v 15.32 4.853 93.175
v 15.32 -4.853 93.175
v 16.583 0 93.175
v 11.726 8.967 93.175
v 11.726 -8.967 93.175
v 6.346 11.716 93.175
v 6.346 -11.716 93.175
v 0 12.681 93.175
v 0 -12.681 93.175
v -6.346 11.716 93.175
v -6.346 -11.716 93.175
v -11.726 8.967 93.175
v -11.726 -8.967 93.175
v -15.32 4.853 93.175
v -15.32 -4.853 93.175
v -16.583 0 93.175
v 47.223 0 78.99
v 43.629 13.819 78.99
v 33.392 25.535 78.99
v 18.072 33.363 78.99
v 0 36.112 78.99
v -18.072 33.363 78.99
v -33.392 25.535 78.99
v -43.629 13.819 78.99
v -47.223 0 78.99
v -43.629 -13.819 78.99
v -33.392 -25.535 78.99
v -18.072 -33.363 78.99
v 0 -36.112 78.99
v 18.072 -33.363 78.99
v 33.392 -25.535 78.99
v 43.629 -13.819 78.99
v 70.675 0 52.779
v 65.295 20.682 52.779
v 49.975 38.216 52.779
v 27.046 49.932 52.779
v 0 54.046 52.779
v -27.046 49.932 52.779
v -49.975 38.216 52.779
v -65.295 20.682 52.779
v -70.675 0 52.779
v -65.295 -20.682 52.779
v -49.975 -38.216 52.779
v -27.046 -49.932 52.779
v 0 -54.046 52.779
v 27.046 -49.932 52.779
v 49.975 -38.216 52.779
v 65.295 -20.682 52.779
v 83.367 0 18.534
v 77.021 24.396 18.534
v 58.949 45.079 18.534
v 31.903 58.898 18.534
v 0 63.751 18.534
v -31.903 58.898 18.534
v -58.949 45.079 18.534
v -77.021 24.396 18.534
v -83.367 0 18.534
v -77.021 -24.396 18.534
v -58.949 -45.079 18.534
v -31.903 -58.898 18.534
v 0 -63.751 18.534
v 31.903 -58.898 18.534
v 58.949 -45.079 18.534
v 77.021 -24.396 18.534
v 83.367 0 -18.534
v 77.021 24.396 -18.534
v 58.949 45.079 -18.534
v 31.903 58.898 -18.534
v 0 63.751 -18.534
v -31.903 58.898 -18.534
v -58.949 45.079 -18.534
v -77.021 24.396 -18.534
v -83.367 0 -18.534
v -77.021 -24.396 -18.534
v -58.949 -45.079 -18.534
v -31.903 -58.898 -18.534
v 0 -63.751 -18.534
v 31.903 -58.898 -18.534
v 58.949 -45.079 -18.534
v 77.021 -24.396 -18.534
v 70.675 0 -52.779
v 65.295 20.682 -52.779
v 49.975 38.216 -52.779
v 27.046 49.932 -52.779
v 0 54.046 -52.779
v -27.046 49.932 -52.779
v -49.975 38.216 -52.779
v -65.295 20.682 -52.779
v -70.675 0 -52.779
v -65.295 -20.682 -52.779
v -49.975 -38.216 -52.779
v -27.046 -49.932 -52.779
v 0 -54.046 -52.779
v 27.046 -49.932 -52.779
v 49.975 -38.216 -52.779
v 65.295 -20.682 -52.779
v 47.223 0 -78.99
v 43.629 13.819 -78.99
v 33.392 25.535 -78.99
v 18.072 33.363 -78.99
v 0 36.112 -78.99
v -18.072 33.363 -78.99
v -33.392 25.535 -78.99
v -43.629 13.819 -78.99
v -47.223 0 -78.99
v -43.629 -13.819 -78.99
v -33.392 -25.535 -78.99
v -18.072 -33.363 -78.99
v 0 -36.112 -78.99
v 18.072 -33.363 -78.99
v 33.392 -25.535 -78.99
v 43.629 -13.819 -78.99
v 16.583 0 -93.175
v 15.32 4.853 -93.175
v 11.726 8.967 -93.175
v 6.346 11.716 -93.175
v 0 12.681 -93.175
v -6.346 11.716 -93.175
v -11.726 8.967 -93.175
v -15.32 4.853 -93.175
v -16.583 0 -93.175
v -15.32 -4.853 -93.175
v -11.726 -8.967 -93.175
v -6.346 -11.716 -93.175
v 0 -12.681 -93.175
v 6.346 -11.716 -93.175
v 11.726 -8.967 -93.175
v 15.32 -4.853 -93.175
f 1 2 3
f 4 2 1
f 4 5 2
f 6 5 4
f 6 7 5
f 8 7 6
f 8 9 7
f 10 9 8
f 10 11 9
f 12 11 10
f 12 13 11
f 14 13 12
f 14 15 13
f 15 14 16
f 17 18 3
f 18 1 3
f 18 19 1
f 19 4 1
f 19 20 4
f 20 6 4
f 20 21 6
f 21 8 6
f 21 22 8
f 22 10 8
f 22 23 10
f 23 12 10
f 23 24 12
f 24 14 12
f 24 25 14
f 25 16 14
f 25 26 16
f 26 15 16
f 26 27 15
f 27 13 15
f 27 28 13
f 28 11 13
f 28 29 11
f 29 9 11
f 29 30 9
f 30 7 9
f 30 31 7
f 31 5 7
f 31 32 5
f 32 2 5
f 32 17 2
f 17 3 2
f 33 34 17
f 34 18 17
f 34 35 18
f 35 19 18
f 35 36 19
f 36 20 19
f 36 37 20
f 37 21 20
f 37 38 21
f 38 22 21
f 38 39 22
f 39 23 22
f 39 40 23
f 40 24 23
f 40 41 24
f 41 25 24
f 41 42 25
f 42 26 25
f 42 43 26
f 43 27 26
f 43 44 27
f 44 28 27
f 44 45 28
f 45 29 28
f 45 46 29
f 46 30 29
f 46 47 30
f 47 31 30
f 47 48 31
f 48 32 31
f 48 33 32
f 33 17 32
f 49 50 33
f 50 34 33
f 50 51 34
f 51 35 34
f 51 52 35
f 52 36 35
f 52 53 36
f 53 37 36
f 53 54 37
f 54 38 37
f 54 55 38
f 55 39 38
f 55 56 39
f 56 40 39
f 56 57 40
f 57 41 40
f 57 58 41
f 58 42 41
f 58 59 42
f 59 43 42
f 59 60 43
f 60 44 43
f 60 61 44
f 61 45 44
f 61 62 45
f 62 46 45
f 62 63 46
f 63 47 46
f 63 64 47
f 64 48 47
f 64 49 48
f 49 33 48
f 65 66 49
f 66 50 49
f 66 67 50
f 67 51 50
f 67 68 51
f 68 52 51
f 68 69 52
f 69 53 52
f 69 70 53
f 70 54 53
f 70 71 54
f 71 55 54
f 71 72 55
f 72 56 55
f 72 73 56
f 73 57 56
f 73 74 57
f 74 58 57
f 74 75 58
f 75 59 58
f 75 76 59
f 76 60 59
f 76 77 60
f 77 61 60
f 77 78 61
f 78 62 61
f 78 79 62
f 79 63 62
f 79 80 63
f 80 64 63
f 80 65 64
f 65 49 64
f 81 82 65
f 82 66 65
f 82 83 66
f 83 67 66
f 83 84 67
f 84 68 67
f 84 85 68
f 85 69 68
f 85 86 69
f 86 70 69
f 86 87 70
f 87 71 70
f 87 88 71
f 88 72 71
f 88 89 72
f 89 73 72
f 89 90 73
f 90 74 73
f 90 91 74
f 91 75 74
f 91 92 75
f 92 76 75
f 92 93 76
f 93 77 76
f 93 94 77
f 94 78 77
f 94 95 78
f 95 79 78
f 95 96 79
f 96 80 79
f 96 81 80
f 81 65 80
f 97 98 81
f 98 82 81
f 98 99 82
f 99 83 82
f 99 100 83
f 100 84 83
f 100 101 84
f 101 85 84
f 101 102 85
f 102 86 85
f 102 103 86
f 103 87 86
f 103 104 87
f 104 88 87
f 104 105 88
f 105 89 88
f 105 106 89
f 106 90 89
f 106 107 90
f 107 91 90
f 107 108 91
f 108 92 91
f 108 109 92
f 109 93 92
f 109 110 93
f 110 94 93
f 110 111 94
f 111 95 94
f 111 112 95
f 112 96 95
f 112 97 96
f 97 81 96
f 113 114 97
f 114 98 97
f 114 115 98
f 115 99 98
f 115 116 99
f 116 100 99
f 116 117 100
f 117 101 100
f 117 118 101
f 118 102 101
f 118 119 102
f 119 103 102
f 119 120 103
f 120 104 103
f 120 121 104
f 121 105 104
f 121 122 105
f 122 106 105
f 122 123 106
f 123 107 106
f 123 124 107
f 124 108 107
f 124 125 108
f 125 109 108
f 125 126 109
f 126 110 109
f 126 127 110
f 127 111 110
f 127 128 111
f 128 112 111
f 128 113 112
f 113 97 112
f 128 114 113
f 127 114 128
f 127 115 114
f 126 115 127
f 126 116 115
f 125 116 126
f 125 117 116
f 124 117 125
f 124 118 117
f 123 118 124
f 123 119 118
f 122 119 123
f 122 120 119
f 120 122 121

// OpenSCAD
// Generated by SolidPython 1.0.1 on 2020-07-29 00:46:53


scale(v = [17, 13, 19]) {
	sphere(r = 5);
}
/***********************************************
*********      SolidPython code:      **********
************************************************
 
# import packages: SolidPython
from solid import *
from solid.utils import *
from itertools import chain, combinations, permutations


class Resize:

    def __init__(self, scad_file):
        self.scad_file = scad_file
        #self.scad_file = import_scad(scad_file)
        # cone/cylinder param:
        self.r1 = 0
        self.r2 = 0
        self.h = 0
        # rectangular prism param:
        self.w = 0
        self.l = 0
        # ellipse param:
        self.r = 0

    # import OpenScad code (file name corresponds to shape)


    # classify shape + parameters
    def assign(self, param1, param2, param3):
        if self.scad_file == 'cone.scad':
            self.r1 = param1
            self.r2 = param2
            self.h = param3
        elif self.scad_file == 'cylinder.scad':
            self.r1 = param1
            self.r2 = param2
            self.h = param3
        elif self.scad_file == 'rectangularPrism.scad':
            self.h = param1
            self.l = param2
            self.w = param3
        else:
            self.r = param1
            self.h = param2

    # resize parameters
    def iterate(self):
        x = range(3, 20, 2)
        i = 1
        if self.scad_file == 'cone.scad':
            tempList = list(permutations(x, 2))
            for temp in tempList:
                param1 = temp[0]
                param2 = temp[1]
                filepath = 'produced_scad_files/' + 'cone' + str(param1) + '_' + str(param2) + '_' + '.scad'
                scad_render_to_file(cylinder(h=param1, r1=param2, r2=0), filepath)

        elif self.scad_file == 'cylinder.scad':
            tempList = list(permutations(x, 3))
            for temp in tempList:
                param1 = temp[0]
                param2 = temp[1]
                filepath = 'produced_scad_files/' + 'cylinder' + str(param1) + '_' + str(param2) + '_' + '.scad'
                scad_render_to_file(cylinder(h=param1, r1=param2, r2=param2), filepath)

        elif self.scad_file == 'rectangularPrism.scad':
            tempList = list(permutations(x, 3))
            for temp in tempList:
                param1 = temp[0]
                param2 = temp[1]
                param3 = temp[2]
                filepath = 'produced_scad_files/' + 'rectangularPrism' + str(param1) + '_' + str(param2) + '_' + str(
                    param3) + '.scad'
                scad_render_to_file(cube(size=(param1, param2, param3)), filepath)

        elif self.scad_file == 'ellipse.scad':
            tempList = list(permutations(x, 4))
            for temp in tempList:
                param1 = temp[0]
                param2 = temp[1]
                param3 = temp[2]
                param4 = temp[3]
                filepath = 'produced_scad_files/' + 'ellipse' + str(param1) + '_' + str(param2) + '_' + str(param3) + '_' + str(param4) + '.scad'
                scad_render_to_file(scale([param1, param2, param3])(sphere(r=param4)), filepath)

    def render_to_scadfile(self):
        scad_render_to_file(scad, 'example.scad') 
 
************************************************/
